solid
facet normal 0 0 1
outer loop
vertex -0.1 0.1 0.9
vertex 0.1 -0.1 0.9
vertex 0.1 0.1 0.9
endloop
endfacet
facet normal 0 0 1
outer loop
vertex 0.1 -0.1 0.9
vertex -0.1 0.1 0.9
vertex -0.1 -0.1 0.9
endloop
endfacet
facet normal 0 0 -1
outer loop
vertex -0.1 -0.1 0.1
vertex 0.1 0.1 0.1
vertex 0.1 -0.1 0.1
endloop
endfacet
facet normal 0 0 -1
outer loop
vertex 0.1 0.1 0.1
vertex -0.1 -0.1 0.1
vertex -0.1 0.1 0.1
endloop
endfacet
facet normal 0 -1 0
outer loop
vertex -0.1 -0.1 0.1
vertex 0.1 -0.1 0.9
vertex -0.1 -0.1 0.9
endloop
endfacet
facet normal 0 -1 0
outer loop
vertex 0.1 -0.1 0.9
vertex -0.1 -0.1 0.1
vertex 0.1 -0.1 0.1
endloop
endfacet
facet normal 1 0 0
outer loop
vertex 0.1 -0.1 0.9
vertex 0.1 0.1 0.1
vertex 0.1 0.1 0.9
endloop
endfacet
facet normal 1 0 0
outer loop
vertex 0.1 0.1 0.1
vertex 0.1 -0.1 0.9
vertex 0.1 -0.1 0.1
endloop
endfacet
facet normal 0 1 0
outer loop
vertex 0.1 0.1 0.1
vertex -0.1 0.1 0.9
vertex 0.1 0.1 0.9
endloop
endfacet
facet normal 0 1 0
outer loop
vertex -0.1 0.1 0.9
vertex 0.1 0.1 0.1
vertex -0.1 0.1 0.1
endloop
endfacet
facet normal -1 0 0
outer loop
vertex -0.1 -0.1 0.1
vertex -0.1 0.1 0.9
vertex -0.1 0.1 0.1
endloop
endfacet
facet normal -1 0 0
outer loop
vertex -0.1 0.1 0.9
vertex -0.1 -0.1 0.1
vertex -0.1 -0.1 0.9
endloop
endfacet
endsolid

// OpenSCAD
color([0.3, 0.3, 0.5])
translate([-0.1,-0.1,0.1])
cube([.2, .2, .8], false);
